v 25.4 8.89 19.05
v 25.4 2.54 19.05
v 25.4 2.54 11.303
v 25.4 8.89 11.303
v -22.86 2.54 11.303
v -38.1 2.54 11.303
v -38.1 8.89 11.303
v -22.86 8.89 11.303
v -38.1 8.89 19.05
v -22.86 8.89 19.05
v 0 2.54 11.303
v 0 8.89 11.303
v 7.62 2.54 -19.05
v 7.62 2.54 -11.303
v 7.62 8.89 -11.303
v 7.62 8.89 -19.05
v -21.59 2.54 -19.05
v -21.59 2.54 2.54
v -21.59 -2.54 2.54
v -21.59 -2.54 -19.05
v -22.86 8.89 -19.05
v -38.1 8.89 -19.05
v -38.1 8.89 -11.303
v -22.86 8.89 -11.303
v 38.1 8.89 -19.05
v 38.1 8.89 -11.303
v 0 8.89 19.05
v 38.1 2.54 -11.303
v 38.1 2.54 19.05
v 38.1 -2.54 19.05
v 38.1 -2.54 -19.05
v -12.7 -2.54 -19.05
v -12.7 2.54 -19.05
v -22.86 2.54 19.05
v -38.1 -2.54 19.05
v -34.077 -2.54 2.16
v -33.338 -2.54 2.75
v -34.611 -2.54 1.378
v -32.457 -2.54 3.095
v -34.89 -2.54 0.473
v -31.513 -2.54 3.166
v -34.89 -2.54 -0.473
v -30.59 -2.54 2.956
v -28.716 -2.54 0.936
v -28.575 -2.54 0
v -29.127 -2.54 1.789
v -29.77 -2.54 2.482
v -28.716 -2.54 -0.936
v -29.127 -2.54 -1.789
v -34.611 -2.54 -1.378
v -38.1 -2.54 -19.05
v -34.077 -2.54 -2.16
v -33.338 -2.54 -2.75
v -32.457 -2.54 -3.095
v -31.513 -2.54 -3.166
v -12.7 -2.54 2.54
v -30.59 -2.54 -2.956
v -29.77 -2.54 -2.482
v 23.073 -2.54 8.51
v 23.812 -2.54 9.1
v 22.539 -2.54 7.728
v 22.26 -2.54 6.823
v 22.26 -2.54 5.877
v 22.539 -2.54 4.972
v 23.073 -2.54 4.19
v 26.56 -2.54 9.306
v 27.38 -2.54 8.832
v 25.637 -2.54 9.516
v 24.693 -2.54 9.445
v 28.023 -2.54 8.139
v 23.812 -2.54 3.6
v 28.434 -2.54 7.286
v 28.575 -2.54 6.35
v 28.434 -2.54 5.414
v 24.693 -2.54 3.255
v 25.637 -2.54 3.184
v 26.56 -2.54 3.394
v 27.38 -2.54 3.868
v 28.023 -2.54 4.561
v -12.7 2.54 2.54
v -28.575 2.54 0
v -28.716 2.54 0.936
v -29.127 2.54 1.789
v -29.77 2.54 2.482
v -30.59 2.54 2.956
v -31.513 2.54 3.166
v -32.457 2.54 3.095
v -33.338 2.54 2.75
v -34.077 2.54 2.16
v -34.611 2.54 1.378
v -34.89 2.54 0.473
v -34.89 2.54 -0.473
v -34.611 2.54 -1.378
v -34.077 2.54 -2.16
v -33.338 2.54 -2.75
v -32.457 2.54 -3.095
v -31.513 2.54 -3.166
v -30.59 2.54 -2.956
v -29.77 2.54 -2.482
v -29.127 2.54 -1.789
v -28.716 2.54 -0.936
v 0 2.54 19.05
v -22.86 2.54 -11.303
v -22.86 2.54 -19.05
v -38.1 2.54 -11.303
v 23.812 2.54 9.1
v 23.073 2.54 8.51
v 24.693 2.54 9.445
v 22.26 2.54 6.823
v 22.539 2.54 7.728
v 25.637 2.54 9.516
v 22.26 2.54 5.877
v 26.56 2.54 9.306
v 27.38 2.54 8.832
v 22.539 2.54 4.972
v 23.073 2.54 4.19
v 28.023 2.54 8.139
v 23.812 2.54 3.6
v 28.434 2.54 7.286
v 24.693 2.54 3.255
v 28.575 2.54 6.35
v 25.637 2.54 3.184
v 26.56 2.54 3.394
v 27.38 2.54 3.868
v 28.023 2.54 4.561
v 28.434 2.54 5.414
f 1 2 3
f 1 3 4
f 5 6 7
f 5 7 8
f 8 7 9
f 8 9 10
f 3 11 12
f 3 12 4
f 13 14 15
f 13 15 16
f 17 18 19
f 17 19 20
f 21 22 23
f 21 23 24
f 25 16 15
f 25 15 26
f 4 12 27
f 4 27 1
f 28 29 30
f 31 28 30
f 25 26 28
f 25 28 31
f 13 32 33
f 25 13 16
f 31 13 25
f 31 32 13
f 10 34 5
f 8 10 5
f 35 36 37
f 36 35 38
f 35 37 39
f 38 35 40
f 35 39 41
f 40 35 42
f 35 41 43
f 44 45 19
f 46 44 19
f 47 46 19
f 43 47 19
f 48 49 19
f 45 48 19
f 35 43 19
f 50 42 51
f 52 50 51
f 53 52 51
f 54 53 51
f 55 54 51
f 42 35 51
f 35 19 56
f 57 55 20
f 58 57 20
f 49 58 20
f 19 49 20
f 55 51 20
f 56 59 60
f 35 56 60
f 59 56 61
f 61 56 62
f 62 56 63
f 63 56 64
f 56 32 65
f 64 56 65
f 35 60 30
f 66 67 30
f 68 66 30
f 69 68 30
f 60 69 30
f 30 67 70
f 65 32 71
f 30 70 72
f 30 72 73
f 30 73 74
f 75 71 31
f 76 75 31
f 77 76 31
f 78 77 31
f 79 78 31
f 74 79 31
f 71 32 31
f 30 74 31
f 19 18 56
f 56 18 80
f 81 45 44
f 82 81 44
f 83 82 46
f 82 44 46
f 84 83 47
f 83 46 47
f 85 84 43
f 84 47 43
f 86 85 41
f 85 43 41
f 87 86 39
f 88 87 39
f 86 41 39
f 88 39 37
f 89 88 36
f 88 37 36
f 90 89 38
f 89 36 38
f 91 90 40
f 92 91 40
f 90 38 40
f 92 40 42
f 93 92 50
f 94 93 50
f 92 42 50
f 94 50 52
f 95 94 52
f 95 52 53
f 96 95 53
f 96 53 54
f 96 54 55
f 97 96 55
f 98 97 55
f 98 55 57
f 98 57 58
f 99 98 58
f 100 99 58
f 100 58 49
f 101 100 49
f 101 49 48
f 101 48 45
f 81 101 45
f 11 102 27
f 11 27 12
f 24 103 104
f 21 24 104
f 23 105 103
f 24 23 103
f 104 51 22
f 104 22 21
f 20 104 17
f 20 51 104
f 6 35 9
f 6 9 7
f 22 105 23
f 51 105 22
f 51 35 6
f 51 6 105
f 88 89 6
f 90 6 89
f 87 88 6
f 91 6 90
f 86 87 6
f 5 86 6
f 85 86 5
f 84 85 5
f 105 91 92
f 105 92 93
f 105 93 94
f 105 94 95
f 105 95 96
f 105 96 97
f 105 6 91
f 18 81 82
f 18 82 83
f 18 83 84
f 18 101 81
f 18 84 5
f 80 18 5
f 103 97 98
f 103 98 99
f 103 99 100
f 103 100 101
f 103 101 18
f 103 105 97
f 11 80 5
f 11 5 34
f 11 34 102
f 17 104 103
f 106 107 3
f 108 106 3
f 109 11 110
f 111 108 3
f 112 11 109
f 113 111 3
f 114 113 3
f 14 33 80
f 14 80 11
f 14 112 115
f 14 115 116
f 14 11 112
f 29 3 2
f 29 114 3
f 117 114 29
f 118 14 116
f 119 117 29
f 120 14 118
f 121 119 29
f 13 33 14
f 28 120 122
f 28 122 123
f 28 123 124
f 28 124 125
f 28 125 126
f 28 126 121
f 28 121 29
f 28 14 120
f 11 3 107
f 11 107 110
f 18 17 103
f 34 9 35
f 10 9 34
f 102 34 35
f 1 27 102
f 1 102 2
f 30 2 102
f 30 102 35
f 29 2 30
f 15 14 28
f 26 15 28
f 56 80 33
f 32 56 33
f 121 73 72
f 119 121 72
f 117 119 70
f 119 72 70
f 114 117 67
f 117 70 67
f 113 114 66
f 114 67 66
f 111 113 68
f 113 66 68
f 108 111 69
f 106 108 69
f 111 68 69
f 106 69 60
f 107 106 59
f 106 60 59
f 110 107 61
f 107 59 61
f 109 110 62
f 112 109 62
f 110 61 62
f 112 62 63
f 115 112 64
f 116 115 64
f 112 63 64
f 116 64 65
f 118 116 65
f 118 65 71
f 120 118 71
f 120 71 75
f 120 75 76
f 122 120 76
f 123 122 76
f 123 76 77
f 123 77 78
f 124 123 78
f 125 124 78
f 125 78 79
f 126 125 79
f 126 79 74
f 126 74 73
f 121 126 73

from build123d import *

# Parameters (mm, degrees)
SKETCH1_W           = 76.2
SKETCH1_H           = 38.1
BOSS_EXTRUDE1_DEPTH = 2.54
SKETCH2_W           = 15.24
SKETCH2_H           = 7.747
SKETCH2_W_2         = 30.48
SKETCH2_W_3         = 38.1
BOSS_EXTRUDE2_DEPTH = 6.35
SKETCH3_W           = 8.89
SKETCH3_H           = 21.59
CUT_EXTRUDE1_DEPTH  = 6.08
SKETCH4_W           = 12.7
SKETCH4_H           = 6.35
CUT_EXTRUDE2_DEPTH  = 7.747
SKETCH5_R           = 3.175
CUT_EXTRUDE3_DEPTH  = 12.43


with BuildPart() as part:
    # Sketch1 → Boss-Extrude1 (new body, symmetric)
    with BuildSketch(Plane(origin=(0, 0, 0), x_dir=(1, 0, 0), z_dir=(0, 1, 0))):
        Rectangle(SKETCH1_W, SKETCH1_H)
    extrude(amount=BOSS_EXTRUDE1_DEPTH, both=True)

    # Sketch2 → Boss-Extrude2 (add)
    with BuildSketch(Plane(origin=(0, 2.54, 0), x_dir=(1, 0, 0), z_dir=(0, 1, 0))):
        with Locations((-30.48, 15.1765)):
            Rectangle(SKETCH2_W, SKETCH2_H)
        with Locations((22.86, 15.1765)):
            Rectangle(SKETCH2_W_2, SKETCH2_H)
        with Locations((19.05, -15.1765)):
            Rectangle(SKETCH2_W_3, SKETCH2_H)
        with Locations((-30.48, -15.1765)):
            Rectangle(SKETCH2_W, SKETCH2_H)
    extrude(amount=BOSS_EXTRUDE2_DEPTH)

    # Sketch3 → Cut-Extrude1 (cut, through all)
    with BuildSketch(Plane(origin=(0, 2.54, 0), x_dir=(1, 0, 0), z_dir=(0, 1, 0))):
        with Locations((-17.145, 8.255)):
            Rectangle(SKETCH3_W, SKETCH3_H)
    extrude(amount=-CUT_EXTRUDE1_DEPTH, mode=Mode.SUBTRACT)

    # Sketch4 → Cut-Extrude2 (cut)
    with BuildSketch(Plane.XY.offset(19.05)):
        with Locations((31.75, 5.715)):
            Rectangle(SKETCH4_W, SKETCH4_H)
    extrude(amount=-CUT_EXTRUDE2_DEPTH, mode=Mode.SUBTRACT)

    # Sketch5 → Cut-Extrude3 (cut, through all)
    with BuildSketch(Plane.XZ.offset(2.54)):
        with Locations((25.4, 6.35)):
            Circle(SKETCH5_R)
        with Locations((-31.75, 0)):
            Circle(SKETCH5_R)
    extrude(amount=-CUT_EXTRUDE3_DEPTH, mode=Mode.SUBTRACT)


solid = part.part
